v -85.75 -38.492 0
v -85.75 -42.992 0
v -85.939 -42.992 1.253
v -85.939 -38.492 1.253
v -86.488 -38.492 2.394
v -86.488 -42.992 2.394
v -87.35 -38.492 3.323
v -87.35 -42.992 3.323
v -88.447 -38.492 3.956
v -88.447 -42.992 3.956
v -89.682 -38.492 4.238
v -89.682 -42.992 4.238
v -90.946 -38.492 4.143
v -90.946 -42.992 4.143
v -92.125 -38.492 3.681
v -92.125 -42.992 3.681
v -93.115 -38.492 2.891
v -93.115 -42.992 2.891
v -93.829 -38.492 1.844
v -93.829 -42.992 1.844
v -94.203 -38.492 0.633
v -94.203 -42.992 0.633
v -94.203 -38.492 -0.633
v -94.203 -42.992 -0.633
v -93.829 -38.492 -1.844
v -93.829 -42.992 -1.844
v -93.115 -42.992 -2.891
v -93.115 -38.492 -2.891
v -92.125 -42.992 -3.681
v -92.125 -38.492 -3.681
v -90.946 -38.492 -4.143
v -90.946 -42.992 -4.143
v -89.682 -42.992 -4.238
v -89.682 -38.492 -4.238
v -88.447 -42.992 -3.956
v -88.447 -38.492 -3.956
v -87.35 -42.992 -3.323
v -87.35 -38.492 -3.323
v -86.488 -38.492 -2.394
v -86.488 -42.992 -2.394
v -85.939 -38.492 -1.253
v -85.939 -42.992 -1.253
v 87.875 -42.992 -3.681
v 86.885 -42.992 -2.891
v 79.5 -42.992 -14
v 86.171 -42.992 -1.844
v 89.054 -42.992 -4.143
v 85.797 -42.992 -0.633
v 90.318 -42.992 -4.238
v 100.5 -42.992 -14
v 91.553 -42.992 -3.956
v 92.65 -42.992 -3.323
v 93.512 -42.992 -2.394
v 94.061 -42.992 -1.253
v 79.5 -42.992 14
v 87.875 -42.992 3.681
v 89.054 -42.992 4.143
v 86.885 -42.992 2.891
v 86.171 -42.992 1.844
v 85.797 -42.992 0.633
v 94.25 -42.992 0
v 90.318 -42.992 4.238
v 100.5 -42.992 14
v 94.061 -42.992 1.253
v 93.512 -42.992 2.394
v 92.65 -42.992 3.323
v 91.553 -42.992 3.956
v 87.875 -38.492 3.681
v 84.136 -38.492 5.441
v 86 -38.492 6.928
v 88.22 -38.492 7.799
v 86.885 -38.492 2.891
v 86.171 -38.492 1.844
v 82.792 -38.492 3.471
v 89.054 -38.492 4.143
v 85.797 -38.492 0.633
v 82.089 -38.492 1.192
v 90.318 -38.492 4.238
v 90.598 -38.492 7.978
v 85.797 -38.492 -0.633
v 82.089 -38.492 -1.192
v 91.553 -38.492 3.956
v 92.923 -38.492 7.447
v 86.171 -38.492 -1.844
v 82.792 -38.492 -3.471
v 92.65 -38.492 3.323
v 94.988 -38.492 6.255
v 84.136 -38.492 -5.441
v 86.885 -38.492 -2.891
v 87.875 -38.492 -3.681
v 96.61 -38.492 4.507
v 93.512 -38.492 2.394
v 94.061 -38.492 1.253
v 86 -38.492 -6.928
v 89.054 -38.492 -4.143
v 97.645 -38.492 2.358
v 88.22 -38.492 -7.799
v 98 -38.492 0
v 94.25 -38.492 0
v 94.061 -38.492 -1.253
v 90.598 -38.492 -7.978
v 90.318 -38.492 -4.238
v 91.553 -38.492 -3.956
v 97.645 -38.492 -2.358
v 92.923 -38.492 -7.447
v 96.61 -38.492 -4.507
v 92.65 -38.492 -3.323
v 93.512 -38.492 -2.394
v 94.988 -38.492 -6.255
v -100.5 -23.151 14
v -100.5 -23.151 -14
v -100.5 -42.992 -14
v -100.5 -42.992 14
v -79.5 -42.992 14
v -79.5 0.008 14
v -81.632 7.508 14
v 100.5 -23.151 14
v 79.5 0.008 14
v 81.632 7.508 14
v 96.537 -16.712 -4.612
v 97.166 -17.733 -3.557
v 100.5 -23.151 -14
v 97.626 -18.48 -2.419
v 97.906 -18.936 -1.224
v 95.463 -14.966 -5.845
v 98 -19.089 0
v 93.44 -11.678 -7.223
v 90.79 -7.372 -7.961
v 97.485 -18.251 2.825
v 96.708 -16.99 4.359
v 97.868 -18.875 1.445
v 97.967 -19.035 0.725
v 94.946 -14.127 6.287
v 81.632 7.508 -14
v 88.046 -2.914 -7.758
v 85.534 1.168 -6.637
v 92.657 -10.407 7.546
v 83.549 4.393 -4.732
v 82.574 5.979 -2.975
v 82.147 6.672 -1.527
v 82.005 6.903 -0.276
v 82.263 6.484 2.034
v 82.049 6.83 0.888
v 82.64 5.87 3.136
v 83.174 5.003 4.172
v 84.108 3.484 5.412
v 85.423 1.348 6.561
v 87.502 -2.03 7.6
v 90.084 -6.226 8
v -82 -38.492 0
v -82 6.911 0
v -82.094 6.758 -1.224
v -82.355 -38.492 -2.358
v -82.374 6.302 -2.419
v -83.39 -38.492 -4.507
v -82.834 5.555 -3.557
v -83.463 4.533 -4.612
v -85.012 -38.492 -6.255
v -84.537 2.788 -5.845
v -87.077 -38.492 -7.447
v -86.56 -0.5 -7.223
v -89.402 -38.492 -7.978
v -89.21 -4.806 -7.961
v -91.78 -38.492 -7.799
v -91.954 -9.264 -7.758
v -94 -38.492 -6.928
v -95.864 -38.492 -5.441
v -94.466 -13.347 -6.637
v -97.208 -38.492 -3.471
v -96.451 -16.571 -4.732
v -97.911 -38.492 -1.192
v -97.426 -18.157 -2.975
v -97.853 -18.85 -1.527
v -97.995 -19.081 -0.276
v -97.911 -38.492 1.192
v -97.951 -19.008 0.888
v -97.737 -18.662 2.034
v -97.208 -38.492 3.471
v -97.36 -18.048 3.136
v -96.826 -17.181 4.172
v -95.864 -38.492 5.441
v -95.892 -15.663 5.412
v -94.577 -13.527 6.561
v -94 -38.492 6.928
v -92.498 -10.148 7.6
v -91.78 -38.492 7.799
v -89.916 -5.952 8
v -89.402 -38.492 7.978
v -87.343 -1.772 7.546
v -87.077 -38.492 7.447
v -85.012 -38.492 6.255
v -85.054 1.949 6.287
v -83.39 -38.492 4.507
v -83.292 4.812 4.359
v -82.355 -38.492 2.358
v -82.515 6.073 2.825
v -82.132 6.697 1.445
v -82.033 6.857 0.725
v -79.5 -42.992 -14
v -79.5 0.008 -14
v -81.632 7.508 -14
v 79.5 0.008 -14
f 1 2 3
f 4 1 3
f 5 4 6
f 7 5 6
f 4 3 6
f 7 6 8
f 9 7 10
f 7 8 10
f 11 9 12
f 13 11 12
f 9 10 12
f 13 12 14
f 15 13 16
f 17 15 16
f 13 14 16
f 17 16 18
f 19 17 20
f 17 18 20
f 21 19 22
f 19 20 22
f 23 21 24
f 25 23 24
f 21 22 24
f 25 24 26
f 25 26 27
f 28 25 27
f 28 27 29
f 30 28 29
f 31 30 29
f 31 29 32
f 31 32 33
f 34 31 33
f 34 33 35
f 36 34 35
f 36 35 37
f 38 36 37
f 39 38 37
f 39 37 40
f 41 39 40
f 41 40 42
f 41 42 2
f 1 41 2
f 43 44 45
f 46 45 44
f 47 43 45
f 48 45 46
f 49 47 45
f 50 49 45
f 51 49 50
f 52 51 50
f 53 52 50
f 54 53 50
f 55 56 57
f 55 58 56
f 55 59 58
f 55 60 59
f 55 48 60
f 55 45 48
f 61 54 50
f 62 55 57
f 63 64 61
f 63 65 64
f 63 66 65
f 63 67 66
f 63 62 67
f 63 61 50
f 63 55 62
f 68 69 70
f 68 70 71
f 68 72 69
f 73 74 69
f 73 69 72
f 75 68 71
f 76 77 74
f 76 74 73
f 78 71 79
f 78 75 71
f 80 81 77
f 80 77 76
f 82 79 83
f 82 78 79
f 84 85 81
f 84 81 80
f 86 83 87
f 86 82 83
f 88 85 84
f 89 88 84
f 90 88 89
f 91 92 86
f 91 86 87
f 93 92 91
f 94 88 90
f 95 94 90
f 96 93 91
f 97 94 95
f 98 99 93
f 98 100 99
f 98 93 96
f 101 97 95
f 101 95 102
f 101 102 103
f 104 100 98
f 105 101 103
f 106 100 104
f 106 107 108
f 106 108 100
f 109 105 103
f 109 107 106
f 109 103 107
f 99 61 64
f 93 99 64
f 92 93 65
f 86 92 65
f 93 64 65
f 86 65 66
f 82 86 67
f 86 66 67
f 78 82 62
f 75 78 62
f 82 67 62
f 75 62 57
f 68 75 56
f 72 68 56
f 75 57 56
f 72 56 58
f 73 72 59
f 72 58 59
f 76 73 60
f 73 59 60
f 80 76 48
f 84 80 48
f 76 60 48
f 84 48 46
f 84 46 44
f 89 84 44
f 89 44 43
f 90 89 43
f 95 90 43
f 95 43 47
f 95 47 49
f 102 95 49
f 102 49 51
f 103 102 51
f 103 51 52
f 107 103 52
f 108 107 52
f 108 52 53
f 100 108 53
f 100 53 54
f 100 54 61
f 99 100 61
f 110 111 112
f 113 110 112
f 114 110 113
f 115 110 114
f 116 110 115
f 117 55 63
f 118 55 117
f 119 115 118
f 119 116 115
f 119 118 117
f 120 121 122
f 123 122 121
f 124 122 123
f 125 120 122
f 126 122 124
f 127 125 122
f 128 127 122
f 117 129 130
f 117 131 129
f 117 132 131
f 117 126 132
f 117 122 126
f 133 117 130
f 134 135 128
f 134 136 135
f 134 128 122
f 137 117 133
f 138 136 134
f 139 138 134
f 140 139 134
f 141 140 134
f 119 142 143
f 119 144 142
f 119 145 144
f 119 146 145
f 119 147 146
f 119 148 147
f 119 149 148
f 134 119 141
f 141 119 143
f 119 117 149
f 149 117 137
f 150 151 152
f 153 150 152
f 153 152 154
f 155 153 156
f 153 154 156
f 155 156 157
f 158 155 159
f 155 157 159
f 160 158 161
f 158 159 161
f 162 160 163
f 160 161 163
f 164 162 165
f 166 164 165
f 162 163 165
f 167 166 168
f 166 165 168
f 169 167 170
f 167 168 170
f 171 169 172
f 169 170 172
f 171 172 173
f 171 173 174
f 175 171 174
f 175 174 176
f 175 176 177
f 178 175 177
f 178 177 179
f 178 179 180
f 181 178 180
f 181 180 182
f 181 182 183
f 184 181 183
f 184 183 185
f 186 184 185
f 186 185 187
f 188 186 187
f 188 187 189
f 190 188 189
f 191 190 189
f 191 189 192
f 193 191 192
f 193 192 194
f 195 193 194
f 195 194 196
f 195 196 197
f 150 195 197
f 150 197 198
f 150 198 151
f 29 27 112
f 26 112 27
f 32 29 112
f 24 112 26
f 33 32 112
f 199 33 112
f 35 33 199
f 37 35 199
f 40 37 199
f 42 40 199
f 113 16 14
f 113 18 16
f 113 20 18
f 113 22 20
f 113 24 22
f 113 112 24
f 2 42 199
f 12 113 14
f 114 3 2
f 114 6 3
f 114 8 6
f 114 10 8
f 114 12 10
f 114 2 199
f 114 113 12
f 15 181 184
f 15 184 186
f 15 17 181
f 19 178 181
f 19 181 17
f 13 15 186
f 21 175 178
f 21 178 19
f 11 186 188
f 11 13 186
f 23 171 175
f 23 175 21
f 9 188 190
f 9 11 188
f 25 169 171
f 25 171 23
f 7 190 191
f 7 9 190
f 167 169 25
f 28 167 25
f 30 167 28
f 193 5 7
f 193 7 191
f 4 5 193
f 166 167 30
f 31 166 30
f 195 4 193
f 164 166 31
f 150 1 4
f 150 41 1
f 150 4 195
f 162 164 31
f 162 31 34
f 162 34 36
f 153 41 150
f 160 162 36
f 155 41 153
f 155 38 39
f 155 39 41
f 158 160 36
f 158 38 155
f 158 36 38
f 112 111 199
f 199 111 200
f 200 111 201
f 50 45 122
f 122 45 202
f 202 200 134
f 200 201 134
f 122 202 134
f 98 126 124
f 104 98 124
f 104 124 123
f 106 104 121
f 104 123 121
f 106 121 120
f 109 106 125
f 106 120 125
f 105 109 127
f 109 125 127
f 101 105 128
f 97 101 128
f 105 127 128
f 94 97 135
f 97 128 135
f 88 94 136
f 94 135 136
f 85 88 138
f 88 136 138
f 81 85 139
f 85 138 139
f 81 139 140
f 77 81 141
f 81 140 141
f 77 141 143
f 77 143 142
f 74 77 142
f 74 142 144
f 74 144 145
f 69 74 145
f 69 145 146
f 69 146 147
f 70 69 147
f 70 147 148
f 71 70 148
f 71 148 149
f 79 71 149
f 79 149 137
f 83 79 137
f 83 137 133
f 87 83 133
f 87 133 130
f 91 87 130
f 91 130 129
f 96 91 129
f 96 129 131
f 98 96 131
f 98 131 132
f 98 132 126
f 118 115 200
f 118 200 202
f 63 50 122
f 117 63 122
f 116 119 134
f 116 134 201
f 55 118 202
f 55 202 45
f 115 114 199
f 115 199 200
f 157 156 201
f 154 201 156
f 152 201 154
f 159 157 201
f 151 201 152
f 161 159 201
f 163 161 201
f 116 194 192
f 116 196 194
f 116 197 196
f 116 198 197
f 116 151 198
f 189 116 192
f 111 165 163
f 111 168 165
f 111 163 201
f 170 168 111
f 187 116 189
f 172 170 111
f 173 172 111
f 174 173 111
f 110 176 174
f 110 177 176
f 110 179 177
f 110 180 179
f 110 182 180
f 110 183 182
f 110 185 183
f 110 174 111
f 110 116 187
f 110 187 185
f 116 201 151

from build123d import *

# Parameters (mm, degrees)
EXTRUDE_1_DEPTH     = 14
SKETCH_3_R          = 4.25
CUT_EXTRUDE_1_DEPTH = 51.5
SKETCH_4_R          = 8
CUT_EXTRUDE_2_DEPTH = 46


with BuildPart() as part:
    # 草图1 → 凸台-拉伸1 (new body, symmetric)
    with BuildSketch(Plane.XY):
        Polygon((-100.5, -42.991652571), (-79.5, -42.991652571), (-79.5, 0.008347429), (79.5, 0.008347429), (79.5, -42.991652571), (100.5, -42.991652571), (100.5, -23.151157314), (81.63217636, 7.508347429), (-81.63217636, 7.508347429), (-100.5, -23.151157314), align=None)
    extrude(amount=EXTRUDE_1_DEPTH, both=True)

    # 草图3 → 切除-拉伸1 (cut, through all)
    with BuildSketch(Plane.XZ.offset(42.991652571)):
        with Locations((-90, 0)):
            Circle(SKETCH_3_R)
        with Locations((90, 0)):
            Circle(SKETCH_3_R)
    extrude(amount=-CUT_EXTRUDE_1_DEPTH, mode=Mode.SUBTRACT)

    # 草图4 → 切除-拉伸2 (cut)
    with BuildSketch(Plane(origin=(0, 7.508347429, 0), x_dir=(1, 0, 0), z_dir=(0, 1, 0))):
        with Locations((-90, 0)):
            Circle(SKETCH_4_R)
        with Locations((90, 0)):
            Circle(SKETCH_4_R)
    extrude(amount=-CUT_EXTRUDE_2_DEPTH, mode=Mode.SUBTRACT)


solid = part.part
